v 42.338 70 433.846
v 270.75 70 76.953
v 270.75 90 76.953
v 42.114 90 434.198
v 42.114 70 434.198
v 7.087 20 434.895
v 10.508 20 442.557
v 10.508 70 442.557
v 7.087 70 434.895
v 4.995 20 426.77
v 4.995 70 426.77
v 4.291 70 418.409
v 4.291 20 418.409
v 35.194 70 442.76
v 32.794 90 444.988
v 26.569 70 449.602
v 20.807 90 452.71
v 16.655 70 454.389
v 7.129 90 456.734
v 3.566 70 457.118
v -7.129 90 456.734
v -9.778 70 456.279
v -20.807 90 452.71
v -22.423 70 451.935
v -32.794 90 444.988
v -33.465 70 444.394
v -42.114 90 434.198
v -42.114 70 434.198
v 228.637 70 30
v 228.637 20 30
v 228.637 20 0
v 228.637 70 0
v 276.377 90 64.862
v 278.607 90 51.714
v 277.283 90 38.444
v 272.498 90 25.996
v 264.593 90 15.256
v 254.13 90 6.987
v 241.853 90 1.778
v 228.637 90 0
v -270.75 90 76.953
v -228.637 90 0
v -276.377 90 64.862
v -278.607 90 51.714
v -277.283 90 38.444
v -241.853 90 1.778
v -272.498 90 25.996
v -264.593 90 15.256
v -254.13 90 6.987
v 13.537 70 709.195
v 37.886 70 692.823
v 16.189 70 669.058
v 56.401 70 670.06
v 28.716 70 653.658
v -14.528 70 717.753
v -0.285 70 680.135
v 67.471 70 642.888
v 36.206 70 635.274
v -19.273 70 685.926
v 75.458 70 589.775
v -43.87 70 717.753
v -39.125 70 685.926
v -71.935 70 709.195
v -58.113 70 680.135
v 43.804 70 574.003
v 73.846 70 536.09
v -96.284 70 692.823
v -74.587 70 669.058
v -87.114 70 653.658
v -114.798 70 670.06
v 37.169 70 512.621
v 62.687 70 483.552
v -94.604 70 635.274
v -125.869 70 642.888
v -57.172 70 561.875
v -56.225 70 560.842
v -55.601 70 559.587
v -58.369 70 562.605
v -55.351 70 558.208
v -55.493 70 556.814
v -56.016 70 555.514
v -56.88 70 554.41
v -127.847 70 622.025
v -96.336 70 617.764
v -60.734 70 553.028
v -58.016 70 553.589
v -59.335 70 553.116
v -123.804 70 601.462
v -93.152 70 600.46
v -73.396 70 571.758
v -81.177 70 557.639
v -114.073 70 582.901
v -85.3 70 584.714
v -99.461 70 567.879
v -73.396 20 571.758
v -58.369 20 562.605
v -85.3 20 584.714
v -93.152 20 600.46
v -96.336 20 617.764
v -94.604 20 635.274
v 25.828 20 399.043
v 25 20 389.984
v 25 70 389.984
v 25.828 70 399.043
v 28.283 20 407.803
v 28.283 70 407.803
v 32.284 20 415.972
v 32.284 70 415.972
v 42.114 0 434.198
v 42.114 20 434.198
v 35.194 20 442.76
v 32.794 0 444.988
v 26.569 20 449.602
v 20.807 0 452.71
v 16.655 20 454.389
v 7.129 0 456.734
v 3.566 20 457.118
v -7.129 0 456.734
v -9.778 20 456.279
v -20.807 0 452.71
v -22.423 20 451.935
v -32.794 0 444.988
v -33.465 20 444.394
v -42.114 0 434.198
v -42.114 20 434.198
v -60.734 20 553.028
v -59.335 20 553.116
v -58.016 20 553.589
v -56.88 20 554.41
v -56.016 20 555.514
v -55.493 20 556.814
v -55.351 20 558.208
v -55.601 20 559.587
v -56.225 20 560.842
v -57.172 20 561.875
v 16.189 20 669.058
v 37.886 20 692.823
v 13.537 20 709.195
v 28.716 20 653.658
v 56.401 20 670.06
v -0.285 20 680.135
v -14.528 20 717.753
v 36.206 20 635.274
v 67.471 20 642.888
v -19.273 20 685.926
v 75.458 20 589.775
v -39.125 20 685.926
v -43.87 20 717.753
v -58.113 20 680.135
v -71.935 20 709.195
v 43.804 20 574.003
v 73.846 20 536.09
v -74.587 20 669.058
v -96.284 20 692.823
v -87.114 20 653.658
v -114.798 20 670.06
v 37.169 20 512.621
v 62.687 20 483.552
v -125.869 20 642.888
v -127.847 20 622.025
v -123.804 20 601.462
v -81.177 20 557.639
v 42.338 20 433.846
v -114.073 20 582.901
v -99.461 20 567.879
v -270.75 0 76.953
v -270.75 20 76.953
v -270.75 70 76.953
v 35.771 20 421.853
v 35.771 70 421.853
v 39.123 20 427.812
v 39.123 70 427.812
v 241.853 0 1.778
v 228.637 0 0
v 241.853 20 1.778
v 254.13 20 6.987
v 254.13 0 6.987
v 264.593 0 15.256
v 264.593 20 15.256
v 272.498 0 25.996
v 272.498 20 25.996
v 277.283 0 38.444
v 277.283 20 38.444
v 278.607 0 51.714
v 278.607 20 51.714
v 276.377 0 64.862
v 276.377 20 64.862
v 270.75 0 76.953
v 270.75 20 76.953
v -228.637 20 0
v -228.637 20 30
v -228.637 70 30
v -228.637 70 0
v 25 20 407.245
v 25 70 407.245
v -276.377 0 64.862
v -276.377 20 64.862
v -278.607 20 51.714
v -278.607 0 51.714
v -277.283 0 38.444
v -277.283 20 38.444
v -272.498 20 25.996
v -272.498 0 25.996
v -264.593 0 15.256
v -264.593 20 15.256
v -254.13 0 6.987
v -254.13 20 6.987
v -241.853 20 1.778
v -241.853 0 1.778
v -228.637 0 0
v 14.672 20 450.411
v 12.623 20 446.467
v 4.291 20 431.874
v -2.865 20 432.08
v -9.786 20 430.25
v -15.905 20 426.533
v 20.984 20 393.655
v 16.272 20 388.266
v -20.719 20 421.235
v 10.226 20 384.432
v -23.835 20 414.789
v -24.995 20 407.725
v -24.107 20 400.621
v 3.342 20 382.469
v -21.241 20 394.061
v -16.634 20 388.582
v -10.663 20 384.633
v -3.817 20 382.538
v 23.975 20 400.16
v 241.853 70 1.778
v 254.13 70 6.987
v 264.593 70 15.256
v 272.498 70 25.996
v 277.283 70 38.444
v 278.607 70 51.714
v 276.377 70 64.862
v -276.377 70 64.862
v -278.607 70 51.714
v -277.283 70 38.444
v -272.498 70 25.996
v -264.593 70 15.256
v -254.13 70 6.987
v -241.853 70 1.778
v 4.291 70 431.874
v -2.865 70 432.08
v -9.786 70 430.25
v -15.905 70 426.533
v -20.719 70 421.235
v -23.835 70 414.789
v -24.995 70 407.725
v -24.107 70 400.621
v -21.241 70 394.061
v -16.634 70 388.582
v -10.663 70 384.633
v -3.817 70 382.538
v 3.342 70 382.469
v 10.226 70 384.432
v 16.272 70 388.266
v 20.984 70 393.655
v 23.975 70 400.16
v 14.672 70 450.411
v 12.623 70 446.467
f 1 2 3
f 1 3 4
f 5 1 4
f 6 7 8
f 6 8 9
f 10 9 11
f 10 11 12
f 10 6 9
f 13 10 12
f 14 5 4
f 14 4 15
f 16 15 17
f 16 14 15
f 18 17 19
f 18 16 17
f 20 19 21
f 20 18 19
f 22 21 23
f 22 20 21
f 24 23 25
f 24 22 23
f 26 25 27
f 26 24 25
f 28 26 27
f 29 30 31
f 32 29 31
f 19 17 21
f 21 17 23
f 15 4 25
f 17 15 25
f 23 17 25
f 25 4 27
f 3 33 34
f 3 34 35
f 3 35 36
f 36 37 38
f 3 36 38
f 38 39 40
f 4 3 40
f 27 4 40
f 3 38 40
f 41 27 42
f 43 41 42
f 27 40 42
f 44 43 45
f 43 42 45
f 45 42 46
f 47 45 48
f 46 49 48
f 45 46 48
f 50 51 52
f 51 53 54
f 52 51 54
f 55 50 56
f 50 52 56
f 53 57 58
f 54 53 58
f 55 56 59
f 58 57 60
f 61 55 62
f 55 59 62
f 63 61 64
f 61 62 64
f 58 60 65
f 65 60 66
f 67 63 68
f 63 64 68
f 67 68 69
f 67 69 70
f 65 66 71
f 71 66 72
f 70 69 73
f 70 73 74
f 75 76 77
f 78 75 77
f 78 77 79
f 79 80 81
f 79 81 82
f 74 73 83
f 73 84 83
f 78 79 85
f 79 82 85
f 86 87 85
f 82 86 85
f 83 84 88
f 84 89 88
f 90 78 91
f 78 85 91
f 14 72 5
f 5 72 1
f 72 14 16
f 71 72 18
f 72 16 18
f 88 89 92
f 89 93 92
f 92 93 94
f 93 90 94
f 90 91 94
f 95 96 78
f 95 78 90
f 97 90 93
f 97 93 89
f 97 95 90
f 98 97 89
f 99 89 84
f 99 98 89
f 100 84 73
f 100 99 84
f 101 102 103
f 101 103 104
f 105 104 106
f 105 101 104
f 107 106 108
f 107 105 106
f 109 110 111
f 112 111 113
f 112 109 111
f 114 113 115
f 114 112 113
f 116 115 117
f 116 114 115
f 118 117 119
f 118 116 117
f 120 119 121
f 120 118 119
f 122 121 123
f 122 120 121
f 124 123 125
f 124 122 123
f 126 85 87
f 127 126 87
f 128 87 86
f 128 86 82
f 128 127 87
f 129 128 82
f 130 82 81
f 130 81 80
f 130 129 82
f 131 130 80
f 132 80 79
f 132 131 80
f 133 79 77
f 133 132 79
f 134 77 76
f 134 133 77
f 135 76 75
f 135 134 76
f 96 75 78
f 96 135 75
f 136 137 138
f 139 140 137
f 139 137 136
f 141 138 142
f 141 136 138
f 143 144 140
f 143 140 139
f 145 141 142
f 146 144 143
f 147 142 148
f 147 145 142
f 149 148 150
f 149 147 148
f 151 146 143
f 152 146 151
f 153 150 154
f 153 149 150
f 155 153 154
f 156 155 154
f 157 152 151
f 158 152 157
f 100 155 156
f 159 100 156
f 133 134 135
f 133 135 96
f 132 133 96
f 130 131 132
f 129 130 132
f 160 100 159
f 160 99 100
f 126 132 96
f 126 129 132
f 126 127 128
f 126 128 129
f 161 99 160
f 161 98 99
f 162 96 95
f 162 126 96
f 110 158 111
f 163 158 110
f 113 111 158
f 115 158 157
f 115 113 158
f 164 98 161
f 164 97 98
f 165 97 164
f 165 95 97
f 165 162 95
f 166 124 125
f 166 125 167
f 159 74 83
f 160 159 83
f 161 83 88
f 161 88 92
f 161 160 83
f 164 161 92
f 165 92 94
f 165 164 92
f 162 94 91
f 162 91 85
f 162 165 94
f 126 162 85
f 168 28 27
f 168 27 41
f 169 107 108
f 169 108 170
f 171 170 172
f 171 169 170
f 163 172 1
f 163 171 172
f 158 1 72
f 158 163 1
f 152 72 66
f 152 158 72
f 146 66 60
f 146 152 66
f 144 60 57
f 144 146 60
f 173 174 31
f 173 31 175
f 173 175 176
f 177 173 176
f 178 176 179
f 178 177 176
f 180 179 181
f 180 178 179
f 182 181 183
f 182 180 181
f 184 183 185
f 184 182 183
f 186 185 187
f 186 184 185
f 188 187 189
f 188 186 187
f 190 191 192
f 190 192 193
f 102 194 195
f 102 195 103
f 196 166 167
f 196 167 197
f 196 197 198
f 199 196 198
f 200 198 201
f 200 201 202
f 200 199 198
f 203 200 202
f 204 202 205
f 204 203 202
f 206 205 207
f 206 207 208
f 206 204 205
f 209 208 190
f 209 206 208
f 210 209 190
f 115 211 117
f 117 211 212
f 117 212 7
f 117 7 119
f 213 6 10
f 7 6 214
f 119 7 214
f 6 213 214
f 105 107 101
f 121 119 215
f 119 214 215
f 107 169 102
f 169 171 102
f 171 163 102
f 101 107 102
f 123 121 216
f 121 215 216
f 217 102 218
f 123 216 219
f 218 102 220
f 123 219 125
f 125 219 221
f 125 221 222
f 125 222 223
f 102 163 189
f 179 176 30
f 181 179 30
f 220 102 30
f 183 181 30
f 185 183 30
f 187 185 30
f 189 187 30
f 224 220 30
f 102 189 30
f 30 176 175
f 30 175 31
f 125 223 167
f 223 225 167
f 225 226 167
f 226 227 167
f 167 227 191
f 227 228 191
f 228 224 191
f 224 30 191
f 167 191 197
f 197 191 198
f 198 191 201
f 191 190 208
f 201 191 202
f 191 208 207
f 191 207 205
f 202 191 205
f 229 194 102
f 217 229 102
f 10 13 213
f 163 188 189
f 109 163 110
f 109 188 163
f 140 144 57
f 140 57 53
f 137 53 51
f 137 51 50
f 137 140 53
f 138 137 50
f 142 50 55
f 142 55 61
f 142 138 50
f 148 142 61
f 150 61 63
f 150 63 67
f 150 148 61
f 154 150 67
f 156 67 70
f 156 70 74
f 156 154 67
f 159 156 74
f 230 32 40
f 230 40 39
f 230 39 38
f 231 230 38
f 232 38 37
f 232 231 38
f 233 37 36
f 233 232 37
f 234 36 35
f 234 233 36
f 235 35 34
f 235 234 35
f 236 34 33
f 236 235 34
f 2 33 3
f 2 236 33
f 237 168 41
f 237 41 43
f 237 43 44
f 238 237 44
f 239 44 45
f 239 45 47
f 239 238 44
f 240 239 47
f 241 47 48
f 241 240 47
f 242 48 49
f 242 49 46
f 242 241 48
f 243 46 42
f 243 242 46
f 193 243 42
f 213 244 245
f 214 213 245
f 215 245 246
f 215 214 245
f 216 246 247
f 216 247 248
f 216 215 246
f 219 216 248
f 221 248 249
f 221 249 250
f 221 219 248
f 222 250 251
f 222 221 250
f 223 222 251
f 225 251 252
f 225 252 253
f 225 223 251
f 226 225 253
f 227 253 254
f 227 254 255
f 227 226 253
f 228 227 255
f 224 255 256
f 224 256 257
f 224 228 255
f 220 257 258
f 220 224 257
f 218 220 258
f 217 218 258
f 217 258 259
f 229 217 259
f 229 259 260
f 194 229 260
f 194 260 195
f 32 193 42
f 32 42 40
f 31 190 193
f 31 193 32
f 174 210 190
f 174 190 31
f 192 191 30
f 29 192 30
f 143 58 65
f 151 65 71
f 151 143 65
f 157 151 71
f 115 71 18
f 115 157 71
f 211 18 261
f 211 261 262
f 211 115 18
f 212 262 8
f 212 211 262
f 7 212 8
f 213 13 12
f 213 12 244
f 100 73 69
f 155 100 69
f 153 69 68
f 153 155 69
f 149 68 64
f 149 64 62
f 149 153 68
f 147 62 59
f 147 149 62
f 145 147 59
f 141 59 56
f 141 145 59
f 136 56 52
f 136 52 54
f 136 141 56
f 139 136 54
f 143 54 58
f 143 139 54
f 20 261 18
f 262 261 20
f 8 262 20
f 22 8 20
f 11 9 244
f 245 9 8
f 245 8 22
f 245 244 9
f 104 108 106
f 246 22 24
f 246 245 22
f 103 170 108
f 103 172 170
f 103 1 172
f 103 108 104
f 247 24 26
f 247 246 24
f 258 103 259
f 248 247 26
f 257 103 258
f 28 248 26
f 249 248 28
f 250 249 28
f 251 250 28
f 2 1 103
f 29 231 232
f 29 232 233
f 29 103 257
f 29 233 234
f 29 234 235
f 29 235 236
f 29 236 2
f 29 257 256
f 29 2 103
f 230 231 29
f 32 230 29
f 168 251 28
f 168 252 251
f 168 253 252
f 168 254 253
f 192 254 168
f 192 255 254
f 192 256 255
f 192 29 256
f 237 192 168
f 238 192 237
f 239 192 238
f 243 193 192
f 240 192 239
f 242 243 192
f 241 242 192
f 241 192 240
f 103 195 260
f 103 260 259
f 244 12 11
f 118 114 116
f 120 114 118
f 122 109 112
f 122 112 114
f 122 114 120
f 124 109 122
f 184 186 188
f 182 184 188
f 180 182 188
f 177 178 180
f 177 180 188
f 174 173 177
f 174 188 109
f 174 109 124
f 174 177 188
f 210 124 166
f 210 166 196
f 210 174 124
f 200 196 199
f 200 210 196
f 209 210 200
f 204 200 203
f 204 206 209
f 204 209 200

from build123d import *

# Parameters (mm, degrees)
BOSS_EXTRUDE1_DEPTH = 20
BOSS_EXTRUDE2_DEPTH = 50
LPATTERN1_COUNT     = 2
LPATTERN1_PITCH     = 70
BOSS_EXTRUDE3_REACH = 776.125
SKETCH3_W           = 457.273423362
SKETCH3_H           = 30


with BuildPart() as part:
    # Sketch1 → Boss-Extrude1 (new body)
    with BuildSketch(Plane(origin=(0, 0, 0), x_dir=(1, 0, 0), z_dir=(0, 1, 0))):
        with BuildLine():
            Line((-228.636711681, 0), (228.636711681, 0))
            ThreePointArc((228.636711681, 0), (272.498051384, -25.996190313), (270.750281714, -76.952684821))
            Line((270.750281714, -76.952684821), (42.113570033, -434.197546823))
            ThreePointArc((42.113570033, -434.197546823), (0, -457.244862002), (-42.113570033, -434.197546823))
            Line((-42.113570033, -434.197546823), (-270.750281714, -76.952684821))
            ThreePointArc((-270.750281714, -76.952684821), (-272.498051384, -25.996190313), (-228.636711681, 0))
        make_face()
    boss_extrude1 = extrude(amount=BOSS_EXTRUDE1_DEPTH)

    # Sketch2 → Boss-Extrude2 (add)
    with BuildSketch(Plane(origin=(0, 20, 0), x_dir=(1, 0, 0), z_dir=(0, 1, 0))):
        with BuildLine():
            Line((25, -407.244862002), (25, -389.984284025))
            ThreePointArc((25, -389.984284025), (26.855525993, -403.479083858), (32.284384902, -415.972285617))
            ThreePointArc((32.284384902, -415.972285617), (72.447700685, -525.93026828), (67.470990768, -642.887877029))
            ThreePointArc((67.470990768, -642.887877029), (-29.198926208, -718.840220009), (-125.868843184, -642.887877029))
            ThreePointArc((-125.868843184, -642.887877029), (-114.073381051, -582.901412142), (-60.734106459, -553.027833807))
            ThreePointArc((-60.734106459, -553.027833807), (-55.492909619, -556.813918342), (-58.368713355, -562.604801979))
            ThreePointArc((-58.368713355, -562.604801979), (-89.779262863, -592.310875601), (-94.604026186, -635.273593035))
            ThreePointArc((-94.604026186, -635.273593035), (-29.198926208, -686.661560891), (36.20617377, -635.273593035))
            ThreePointArc((36.20617377, -635.273593035), (41.462255839, -536.500850943), (10.508220975, -442.556565834))
            ThreePointArc((10.508220975, -442.556565834), (5.87000649, -430.876676247), (4.290677946, -418.409175466))
            Line((4.290677946, -418.409175466), (4.290677946, -431.873911573))
            ThreePointArc((4.290677946, -431.873911573), (-19.134614559, -391.155532443), (25, -407.244862002))
        make_face()
    extrude(amount=BOSS_EXTRUDE2_DEPTH)

    # LPattern1: Boss-Extrude1 ×2
    with Locations(*[(0, i * LPATTERN1_PITCH, 0) for i in range(1, LPATTERN1_COUNT)]):
        add(boss_extrude1)

    # Sketch3 → Boss-Extrude3 (add, up to next)
    with BuildSketch(Plane(origin=(0, 20, 0), x_dir=(1, 0, 0), z_dir=(0, 1, 0)), mode=Mode.PRIVATE) as boss_extrude3_sk1:
        with Locations((0, -15)):
            Rectangle(SKETCH3_W, SKETCH3_H)
    boss_extrude3_tool1 = extrude(boss_extrude3_sk1.sketch, amount=BOSS_EXTRUDE3_REACH, mode=Mode.PRIVATE) - part.part
    add(boss_extrude3_tool1.solids().sort_by_distance((0, 20, 15))[0])


solid = part.part
